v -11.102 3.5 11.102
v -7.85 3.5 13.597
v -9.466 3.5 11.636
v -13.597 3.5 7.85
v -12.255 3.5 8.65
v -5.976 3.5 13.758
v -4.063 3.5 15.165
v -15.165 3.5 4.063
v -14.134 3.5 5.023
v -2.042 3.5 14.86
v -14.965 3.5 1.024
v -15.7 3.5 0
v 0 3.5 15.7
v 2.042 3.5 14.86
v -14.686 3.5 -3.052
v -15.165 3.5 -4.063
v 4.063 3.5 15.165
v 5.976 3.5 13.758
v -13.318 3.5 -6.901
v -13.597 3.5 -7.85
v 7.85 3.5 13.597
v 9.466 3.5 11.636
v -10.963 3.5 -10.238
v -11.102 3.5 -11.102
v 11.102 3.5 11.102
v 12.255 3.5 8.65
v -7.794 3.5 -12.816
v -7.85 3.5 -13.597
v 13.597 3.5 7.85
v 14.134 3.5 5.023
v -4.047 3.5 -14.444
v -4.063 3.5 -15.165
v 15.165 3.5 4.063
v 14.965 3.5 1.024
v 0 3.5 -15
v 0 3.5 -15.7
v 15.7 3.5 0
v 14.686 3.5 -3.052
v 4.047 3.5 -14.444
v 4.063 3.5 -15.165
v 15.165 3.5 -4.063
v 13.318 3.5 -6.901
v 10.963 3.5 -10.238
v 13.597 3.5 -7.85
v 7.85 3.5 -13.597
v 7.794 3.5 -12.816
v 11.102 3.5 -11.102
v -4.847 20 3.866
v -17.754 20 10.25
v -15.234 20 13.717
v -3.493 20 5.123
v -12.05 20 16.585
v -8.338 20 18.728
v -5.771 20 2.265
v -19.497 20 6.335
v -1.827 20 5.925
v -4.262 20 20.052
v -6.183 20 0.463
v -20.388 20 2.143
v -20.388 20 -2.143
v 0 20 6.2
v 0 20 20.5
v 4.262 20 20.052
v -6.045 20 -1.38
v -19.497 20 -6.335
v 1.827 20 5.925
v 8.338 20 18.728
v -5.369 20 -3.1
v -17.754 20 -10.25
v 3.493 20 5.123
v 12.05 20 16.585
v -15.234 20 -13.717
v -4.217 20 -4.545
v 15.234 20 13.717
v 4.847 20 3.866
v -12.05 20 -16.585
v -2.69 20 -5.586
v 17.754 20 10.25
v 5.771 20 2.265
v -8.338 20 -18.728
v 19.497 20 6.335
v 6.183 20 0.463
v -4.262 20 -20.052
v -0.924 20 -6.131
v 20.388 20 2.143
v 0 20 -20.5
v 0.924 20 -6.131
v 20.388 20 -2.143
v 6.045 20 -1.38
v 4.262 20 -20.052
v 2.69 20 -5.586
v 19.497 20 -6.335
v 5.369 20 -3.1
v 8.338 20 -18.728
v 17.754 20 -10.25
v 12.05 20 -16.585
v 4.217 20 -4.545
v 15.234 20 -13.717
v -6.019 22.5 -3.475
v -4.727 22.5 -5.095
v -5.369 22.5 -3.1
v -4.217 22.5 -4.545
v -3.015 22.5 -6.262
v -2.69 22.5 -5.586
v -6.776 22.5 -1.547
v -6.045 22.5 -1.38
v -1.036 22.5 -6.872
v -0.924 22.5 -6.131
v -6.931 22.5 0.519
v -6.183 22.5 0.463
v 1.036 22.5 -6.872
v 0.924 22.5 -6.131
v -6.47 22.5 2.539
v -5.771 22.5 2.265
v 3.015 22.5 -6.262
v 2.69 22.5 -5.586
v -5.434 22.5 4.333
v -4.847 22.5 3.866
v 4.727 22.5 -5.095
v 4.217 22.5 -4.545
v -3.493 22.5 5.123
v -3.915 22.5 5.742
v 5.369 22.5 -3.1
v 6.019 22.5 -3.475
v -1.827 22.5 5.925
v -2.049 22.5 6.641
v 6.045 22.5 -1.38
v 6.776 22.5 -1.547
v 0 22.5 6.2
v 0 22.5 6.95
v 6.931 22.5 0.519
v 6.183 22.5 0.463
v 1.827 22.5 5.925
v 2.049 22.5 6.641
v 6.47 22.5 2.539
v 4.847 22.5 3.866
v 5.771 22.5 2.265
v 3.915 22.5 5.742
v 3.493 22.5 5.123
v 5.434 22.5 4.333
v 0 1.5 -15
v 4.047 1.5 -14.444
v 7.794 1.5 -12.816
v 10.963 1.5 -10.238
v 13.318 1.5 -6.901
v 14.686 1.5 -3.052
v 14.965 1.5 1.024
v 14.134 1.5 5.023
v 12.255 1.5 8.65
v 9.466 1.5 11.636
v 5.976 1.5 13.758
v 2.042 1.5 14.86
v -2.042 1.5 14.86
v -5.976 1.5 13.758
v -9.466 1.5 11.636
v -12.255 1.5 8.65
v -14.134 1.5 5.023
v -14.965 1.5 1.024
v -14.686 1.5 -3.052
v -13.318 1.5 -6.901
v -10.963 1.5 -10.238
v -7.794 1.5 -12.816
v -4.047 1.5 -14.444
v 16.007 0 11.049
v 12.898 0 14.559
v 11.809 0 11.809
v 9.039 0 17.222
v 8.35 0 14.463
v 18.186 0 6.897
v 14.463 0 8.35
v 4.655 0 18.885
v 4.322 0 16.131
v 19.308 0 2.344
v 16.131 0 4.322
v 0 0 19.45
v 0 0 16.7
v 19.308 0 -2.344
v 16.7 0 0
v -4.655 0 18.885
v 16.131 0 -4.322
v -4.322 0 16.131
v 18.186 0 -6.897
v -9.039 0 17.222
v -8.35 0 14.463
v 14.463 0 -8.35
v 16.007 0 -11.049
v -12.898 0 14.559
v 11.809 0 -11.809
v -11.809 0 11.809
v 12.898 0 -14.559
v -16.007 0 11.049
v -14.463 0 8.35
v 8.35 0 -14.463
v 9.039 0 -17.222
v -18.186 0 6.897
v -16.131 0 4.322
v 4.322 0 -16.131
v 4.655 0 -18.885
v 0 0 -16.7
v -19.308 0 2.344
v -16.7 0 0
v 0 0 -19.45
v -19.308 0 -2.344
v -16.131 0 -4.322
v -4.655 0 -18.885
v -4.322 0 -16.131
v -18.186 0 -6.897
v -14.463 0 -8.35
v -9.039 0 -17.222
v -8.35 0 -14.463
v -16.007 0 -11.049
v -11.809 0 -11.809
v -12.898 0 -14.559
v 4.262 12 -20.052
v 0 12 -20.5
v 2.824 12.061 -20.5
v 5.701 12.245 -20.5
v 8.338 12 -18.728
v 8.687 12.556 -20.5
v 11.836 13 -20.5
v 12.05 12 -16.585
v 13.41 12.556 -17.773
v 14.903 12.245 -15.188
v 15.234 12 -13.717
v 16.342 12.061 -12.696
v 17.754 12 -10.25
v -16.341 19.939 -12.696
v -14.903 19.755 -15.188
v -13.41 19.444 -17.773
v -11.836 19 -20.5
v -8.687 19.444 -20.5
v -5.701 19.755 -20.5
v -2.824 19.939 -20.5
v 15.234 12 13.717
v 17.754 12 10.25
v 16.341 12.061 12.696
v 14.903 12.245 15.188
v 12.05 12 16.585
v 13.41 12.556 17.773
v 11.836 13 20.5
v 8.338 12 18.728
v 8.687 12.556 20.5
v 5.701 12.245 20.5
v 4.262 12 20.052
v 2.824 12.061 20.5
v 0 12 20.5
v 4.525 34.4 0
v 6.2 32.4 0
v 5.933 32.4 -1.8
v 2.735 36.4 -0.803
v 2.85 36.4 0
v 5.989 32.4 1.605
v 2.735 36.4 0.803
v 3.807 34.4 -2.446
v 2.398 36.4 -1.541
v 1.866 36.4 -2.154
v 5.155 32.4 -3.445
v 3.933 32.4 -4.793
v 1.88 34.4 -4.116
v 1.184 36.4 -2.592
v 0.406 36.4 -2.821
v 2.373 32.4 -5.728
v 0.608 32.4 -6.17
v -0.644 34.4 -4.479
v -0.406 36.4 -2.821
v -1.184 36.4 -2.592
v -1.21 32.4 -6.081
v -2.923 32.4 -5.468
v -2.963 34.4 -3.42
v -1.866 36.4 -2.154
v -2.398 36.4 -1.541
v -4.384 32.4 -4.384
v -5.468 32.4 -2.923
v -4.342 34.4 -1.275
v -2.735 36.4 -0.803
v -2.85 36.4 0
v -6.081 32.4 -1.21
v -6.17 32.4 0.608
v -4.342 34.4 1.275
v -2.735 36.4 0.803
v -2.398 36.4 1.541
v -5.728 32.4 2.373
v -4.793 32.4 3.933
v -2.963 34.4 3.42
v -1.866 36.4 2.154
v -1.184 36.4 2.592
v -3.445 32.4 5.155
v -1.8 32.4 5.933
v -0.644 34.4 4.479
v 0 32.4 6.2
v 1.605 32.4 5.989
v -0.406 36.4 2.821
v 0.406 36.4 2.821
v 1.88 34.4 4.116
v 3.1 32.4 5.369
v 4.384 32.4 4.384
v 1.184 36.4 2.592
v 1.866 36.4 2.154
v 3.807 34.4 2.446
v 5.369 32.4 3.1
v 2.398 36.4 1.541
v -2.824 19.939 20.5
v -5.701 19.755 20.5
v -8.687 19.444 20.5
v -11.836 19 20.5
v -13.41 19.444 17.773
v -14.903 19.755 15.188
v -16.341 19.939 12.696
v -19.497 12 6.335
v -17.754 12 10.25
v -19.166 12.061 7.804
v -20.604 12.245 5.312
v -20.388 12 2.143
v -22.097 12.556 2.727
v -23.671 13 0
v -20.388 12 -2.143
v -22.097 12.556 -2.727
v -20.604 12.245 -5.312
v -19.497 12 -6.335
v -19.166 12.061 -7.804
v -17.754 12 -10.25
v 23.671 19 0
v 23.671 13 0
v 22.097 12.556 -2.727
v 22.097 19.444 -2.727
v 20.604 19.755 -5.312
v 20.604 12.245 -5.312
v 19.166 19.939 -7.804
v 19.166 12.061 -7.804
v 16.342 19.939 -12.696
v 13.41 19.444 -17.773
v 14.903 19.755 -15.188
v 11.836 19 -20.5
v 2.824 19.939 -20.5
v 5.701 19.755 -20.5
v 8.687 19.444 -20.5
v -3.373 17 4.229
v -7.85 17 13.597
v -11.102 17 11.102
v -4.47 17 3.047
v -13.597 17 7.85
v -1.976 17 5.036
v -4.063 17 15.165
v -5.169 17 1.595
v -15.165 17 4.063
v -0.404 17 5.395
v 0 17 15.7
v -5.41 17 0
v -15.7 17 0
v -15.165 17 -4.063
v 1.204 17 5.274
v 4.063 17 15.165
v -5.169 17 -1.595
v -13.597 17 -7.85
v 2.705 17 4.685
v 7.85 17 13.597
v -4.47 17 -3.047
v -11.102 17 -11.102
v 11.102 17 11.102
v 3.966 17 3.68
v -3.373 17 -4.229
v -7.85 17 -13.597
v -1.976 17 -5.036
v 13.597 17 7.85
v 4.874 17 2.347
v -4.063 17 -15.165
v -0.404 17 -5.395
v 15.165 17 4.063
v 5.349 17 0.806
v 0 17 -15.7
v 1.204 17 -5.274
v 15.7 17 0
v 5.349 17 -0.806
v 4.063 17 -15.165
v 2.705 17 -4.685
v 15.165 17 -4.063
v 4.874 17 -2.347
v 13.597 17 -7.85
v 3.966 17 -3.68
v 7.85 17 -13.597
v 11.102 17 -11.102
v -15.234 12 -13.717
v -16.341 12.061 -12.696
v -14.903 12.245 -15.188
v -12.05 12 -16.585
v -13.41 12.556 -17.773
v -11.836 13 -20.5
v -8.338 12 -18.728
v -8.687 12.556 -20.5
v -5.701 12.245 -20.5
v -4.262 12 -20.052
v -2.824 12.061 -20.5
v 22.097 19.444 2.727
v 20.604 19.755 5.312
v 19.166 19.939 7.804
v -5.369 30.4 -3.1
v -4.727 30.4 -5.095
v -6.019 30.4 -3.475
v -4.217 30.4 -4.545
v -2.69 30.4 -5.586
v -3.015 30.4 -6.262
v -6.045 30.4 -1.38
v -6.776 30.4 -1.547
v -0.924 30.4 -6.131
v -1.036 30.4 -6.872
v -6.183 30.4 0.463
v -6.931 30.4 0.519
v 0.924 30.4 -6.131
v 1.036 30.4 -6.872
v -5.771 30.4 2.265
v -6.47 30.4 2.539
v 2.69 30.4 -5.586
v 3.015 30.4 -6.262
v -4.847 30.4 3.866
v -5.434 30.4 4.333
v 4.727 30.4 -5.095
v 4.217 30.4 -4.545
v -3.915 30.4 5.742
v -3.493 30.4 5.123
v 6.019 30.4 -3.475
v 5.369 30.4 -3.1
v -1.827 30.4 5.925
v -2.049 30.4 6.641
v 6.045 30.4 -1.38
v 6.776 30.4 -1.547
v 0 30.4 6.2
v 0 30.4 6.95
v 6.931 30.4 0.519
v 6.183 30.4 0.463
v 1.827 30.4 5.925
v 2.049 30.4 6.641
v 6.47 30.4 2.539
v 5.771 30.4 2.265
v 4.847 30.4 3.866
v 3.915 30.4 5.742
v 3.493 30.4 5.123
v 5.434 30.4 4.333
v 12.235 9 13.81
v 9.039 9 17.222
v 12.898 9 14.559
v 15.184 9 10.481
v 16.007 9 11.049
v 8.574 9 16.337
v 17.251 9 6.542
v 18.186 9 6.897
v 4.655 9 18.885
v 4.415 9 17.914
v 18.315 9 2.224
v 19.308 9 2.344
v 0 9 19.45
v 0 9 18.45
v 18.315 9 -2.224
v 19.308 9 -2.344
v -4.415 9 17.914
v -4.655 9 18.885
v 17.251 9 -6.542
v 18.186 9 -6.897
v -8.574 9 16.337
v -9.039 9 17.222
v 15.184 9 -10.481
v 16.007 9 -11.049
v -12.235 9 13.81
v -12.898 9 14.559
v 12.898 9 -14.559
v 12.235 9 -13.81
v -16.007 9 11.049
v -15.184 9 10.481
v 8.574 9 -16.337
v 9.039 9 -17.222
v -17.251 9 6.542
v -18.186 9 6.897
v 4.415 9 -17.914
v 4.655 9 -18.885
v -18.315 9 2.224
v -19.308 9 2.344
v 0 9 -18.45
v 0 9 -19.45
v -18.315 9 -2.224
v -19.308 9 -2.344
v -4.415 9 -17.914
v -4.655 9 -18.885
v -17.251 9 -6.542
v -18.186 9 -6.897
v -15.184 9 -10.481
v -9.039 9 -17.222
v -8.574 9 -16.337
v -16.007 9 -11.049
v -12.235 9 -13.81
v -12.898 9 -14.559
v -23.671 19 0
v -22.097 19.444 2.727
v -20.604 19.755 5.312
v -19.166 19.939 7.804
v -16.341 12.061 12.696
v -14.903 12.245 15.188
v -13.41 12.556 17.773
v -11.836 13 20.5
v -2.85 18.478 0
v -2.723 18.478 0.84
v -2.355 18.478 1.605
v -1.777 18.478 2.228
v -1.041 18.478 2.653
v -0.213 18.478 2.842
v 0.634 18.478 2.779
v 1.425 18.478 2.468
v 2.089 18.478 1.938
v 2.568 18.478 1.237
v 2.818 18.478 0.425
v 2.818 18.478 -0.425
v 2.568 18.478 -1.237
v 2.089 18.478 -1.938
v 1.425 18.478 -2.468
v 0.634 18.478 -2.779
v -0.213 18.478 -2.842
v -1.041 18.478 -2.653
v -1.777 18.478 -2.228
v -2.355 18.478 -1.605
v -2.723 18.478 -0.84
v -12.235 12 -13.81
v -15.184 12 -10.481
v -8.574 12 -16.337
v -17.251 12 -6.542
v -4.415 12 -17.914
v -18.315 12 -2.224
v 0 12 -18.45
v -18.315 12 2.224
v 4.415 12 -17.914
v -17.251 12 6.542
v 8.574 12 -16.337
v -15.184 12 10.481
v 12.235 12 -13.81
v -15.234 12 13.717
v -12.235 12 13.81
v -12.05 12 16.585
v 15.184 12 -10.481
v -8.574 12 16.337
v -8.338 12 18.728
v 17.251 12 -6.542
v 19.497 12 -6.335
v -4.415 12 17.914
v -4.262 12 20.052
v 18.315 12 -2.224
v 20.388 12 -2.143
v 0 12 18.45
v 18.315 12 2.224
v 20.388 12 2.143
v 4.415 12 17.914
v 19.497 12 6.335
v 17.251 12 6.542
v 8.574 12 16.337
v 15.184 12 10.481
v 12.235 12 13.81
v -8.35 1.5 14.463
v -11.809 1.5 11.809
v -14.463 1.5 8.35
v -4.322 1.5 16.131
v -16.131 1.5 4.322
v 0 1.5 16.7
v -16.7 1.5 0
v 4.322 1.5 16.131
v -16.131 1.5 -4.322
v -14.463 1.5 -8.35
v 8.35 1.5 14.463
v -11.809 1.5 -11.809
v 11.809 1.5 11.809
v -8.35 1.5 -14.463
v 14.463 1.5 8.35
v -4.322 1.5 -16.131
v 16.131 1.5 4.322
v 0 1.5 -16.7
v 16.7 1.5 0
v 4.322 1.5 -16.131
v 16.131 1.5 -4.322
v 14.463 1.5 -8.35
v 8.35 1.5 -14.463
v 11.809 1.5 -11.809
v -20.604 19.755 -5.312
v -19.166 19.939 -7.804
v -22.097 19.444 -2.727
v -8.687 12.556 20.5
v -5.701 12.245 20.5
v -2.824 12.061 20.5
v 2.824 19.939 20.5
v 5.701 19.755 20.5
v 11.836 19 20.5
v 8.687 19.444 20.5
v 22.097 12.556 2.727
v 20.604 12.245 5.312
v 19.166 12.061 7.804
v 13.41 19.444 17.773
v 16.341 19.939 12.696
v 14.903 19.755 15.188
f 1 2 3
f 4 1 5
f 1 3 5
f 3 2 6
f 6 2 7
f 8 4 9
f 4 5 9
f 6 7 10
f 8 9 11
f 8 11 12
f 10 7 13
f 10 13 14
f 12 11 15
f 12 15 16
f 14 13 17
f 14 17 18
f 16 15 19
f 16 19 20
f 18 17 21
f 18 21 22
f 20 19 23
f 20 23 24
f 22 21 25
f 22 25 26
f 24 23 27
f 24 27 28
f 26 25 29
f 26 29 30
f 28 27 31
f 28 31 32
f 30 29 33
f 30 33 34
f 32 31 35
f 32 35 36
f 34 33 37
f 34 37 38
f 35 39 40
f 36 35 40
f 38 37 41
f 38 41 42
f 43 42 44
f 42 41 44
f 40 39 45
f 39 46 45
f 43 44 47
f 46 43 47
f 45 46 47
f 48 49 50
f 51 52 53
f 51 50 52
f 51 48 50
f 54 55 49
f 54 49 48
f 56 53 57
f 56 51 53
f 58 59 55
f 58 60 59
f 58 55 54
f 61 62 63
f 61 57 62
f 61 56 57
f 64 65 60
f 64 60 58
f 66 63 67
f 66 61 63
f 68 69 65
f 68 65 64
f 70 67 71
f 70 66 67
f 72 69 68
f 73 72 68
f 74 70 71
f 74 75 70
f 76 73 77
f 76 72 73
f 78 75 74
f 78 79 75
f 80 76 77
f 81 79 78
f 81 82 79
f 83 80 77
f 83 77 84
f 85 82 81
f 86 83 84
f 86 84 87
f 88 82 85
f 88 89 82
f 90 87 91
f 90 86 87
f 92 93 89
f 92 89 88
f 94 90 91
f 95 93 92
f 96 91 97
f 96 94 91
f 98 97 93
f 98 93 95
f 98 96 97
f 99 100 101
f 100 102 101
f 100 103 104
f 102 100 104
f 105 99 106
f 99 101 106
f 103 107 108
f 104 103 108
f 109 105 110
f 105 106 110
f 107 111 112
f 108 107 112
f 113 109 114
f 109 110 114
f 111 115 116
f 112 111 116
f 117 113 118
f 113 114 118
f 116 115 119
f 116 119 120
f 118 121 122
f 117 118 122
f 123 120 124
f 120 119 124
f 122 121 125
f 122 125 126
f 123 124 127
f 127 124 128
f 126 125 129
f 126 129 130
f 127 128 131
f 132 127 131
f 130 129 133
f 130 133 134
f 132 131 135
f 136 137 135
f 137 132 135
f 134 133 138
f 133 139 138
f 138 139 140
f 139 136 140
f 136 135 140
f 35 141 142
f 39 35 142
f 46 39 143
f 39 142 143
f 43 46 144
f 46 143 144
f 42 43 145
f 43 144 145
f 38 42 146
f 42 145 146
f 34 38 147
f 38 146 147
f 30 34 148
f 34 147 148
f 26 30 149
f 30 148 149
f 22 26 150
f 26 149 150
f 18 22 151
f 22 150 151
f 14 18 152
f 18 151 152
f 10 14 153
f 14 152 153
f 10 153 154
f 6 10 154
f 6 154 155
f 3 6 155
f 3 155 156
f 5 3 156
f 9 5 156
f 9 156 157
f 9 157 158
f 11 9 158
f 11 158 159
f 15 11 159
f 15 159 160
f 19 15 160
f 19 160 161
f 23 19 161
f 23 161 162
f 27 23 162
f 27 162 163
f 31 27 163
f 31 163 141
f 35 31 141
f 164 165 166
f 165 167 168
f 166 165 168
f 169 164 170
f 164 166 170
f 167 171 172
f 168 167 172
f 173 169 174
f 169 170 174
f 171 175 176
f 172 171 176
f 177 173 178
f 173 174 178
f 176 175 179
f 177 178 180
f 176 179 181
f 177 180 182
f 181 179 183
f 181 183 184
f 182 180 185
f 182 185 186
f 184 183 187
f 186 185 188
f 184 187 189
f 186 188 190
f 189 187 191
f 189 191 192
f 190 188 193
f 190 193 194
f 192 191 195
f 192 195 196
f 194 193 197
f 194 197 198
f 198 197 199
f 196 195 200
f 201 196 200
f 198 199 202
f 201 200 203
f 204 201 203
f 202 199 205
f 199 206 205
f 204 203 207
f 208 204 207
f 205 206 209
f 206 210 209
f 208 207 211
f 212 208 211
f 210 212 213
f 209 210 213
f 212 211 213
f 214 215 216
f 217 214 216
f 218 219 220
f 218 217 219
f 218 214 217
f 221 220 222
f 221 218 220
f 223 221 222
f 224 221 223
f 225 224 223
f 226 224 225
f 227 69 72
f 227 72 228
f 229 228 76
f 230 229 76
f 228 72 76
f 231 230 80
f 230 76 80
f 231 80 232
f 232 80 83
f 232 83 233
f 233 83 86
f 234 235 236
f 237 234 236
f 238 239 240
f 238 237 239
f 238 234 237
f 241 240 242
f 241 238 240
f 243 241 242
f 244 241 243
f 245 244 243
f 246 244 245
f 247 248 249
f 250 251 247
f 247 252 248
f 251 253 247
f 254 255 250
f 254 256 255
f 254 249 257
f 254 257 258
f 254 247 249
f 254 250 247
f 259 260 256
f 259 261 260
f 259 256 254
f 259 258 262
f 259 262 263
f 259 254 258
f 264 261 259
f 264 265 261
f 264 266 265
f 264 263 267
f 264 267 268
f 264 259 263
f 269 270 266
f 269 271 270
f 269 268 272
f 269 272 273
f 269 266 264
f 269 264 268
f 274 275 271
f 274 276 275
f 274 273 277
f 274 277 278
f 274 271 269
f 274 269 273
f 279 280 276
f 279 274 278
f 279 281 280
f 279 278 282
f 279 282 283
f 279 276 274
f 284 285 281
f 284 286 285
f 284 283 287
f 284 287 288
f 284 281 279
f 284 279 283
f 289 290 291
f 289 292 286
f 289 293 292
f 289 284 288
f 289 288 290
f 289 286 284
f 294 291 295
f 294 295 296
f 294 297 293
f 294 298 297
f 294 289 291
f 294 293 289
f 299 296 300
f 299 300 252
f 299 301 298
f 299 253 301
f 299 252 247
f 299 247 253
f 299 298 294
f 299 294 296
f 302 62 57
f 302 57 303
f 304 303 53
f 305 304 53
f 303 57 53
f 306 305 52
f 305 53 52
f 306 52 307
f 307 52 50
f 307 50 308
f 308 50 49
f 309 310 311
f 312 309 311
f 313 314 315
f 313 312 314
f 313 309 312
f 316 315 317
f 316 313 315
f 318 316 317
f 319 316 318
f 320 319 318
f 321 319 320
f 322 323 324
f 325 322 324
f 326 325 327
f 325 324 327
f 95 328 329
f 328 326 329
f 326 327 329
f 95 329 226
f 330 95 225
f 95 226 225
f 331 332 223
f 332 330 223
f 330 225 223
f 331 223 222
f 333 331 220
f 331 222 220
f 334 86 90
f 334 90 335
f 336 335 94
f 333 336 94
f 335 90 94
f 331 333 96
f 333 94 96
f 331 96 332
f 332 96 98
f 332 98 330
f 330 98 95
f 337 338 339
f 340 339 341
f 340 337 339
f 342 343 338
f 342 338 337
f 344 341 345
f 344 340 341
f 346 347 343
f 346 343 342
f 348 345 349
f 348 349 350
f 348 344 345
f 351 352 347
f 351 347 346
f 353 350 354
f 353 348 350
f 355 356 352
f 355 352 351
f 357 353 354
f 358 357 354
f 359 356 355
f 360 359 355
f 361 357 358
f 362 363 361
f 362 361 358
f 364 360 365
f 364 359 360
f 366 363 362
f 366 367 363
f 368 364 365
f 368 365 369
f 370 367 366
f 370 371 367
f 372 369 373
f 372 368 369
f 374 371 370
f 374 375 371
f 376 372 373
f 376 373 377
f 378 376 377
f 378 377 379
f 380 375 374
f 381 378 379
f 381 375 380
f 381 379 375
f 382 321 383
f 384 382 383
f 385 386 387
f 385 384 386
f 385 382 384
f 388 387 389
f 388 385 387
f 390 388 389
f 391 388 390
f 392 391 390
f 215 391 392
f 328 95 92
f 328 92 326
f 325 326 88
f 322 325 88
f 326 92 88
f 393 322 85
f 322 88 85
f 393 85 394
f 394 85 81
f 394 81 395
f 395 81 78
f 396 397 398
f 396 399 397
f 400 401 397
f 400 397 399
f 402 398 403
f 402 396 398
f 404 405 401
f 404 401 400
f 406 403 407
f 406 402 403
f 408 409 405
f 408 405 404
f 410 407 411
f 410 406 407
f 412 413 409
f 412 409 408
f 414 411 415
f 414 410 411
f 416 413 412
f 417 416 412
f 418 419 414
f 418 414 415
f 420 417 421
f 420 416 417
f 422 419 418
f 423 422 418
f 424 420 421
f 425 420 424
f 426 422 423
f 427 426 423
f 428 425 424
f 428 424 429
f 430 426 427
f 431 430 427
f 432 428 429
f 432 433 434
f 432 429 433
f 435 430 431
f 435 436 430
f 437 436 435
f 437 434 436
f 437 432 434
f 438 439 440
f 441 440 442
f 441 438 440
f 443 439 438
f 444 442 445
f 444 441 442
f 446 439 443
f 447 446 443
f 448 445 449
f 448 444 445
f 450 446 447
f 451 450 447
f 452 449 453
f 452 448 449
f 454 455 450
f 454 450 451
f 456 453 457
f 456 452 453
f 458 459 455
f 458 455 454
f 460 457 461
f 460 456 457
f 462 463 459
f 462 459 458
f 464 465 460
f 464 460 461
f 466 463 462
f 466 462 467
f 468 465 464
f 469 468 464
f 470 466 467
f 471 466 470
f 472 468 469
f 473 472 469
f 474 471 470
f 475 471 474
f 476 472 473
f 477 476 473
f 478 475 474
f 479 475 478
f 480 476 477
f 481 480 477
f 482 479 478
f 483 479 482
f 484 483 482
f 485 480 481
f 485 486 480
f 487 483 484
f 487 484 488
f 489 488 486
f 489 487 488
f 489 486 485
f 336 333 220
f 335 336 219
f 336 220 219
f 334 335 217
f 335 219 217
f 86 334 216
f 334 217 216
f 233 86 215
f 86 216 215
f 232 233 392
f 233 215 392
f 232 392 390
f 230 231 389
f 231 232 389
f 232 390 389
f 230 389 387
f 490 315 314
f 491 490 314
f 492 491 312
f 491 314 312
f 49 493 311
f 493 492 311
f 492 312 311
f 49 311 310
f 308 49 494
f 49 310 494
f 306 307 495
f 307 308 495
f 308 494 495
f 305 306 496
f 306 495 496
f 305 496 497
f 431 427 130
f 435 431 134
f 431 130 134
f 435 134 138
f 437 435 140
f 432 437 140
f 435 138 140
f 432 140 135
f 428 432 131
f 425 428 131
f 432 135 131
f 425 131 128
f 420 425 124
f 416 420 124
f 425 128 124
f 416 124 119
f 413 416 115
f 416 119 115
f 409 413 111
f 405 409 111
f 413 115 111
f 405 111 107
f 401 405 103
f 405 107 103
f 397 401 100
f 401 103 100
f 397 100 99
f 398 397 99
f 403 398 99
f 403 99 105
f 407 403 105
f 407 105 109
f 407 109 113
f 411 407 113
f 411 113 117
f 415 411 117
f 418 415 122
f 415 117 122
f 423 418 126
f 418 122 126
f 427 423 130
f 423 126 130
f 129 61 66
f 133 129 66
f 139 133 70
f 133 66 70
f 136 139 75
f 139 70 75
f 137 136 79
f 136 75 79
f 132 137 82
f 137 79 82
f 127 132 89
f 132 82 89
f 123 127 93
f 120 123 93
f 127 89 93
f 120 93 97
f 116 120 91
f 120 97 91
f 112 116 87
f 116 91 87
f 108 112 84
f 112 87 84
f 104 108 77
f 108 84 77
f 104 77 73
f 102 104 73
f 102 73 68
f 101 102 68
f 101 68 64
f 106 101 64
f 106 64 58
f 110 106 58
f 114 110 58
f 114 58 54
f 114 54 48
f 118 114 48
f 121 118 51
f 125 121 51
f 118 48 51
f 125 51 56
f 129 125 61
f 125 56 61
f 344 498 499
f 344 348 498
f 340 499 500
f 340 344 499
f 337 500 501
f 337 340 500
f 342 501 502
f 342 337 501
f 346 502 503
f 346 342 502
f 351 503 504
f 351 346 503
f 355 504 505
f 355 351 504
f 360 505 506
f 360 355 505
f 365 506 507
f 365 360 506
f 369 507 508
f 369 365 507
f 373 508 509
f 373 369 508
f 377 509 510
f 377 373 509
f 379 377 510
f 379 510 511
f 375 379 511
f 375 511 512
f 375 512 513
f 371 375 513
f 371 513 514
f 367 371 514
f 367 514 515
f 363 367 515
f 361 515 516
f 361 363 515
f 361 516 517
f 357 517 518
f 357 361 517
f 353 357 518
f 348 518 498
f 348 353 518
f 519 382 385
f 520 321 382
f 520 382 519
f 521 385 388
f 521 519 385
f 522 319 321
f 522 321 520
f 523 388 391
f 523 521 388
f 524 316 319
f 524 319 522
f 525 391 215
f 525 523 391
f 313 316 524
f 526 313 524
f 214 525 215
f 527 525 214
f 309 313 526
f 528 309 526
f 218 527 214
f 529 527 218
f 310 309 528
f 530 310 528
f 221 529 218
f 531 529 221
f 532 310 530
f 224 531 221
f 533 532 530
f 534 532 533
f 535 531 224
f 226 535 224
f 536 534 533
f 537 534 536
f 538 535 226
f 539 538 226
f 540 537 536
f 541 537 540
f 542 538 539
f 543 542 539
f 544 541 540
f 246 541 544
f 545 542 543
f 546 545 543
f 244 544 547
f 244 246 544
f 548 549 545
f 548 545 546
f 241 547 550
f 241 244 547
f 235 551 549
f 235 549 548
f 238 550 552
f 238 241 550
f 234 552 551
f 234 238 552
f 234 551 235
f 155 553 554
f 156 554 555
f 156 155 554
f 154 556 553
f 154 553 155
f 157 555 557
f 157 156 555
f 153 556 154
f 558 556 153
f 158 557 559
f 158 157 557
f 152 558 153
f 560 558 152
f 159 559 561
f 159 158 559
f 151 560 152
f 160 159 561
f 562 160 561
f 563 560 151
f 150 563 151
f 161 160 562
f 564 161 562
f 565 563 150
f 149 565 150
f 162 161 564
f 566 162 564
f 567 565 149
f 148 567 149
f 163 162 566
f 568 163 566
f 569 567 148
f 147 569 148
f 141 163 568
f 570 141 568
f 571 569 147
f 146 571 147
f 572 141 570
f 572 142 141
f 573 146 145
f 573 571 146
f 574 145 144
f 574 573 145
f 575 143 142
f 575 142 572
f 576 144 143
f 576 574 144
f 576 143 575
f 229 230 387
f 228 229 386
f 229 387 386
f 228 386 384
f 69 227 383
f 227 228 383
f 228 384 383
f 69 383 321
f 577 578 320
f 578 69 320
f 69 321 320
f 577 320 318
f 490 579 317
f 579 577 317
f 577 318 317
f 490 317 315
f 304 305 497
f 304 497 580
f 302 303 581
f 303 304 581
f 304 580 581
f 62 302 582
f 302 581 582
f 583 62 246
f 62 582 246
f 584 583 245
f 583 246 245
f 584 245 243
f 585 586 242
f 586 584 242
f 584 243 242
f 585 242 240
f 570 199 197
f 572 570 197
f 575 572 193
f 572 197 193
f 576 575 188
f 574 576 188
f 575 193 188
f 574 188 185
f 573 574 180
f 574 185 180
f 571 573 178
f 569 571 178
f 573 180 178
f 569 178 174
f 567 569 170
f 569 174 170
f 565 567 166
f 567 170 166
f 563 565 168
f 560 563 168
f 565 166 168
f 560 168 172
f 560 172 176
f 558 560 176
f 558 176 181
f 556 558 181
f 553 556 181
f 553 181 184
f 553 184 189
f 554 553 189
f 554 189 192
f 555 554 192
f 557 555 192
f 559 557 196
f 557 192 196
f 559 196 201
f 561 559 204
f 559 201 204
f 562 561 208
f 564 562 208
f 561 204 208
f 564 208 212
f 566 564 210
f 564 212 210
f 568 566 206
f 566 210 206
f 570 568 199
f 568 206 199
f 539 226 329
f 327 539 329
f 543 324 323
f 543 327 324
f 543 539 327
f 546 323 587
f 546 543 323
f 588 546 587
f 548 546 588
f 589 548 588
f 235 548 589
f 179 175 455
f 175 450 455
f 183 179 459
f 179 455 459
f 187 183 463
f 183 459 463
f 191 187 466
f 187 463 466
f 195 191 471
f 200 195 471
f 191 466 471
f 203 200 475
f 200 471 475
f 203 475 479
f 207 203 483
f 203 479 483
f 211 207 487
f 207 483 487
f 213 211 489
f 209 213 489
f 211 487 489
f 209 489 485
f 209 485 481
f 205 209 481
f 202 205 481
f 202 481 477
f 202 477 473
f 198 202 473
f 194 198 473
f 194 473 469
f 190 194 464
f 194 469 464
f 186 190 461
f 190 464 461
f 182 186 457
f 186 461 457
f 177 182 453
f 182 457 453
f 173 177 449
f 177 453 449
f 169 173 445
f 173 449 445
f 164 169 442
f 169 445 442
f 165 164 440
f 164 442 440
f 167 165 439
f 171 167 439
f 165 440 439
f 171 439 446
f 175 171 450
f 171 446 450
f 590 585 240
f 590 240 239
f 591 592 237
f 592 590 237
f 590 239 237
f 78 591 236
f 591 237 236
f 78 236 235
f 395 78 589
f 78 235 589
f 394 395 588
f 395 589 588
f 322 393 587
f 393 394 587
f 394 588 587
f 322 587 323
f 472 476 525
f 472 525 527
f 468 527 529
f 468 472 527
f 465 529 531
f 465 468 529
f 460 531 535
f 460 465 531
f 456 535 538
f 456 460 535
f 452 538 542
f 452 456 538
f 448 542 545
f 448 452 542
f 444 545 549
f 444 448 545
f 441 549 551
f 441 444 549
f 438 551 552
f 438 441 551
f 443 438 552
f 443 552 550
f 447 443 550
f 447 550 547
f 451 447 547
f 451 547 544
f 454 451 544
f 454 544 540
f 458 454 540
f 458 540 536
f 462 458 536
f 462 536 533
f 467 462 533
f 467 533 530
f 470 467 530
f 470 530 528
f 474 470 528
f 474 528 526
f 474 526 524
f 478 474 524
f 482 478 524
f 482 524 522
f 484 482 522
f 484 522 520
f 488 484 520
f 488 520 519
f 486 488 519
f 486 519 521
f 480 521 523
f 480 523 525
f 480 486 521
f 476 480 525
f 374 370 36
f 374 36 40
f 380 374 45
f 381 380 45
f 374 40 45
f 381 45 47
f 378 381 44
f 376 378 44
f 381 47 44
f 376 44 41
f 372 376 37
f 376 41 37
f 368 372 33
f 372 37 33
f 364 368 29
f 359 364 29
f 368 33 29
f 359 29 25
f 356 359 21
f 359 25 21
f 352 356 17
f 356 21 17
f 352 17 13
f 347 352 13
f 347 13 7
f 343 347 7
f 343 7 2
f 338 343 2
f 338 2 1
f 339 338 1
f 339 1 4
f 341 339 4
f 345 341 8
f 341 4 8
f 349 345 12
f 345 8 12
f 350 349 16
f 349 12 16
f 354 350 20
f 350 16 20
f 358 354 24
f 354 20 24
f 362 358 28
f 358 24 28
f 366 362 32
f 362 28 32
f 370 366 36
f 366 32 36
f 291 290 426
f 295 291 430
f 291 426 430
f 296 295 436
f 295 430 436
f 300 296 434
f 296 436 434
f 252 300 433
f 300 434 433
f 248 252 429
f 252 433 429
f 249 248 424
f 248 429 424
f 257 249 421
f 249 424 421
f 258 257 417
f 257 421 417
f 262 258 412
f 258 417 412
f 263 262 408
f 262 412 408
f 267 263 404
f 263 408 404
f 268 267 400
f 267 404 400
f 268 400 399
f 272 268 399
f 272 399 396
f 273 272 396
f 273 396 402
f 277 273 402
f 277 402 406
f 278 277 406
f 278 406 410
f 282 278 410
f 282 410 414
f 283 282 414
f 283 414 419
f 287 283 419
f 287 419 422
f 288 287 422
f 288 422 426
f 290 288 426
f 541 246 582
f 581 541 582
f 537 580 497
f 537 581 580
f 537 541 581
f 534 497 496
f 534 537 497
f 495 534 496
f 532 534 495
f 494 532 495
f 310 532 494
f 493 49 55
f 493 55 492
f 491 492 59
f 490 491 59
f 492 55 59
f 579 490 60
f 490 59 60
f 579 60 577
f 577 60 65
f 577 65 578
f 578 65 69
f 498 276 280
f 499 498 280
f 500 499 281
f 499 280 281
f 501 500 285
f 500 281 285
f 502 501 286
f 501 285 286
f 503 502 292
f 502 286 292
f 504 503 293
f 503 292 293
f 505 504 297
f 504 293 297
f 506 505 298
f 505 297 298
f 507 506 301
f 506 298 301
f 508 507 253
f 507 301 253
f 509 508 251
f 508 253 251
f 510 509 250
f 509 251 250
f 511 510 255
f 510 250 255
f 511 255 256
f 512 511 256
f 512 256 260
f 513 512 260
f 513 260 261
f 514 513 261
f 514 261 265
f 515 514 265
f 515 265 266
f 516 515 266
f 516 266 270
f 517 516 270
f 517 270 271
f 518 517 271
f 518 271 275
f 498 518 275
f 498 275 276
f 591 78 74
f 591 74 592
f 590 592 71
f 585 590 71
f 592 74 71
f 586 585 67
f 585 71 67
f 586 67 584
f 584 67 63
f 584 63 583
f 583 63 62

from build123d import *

# Parameters (mm, degrees)
EXTRUDE_1_DEPTH     = 20
SKETCH_3_OUTSIDE_W  = 62.49
SKETCH_3_OUTSIDE_H  = 56.148
SKETCH_3_OUTSIDE_R  = 18.45
CUT_EXTRUDE_1_DEPTH = 12
SKETCH_11_R         = 16.7
CUT_EXTRUDE_2_DEPTH = 1.5
SKETCH_13_R         = 15
CUT_EXTRUDE_4_DEPTH = 17
SKETCH_14_R         = 15.7
CUT_EXTRUDE_5_DEPTH = 13.5
SKETCH_15_W         = 1
SKETCH_15_H         = 9
SKETCH_16_R         = 6.2
EXTRUDE_2_DEPTH     = 2.5
SKETCH_17_R         = 6.95
EXTRUDE_3_DEPTH     = 7.9
SKETCH_18_R         = 6.2
EXTRUDE_4_DEPTH     = 2
SKETCH_21_R         = 2.85
CUT_EXTRUDE_6_DEPTH = 49.016073698


with BuildPart() as part:
    # Эскиз2 → Бобышка-Вытянуть1 (new body)
    with BuildSketch(Plane(origin=(0, 0, 0), x_dir=(1, 0, 0), z_dir=(0, 1, 0))):
        Polygon((11.835680518, -20.5), (23.671361037, 0), (11.835680518, 20.5), (-11.835680518, 20.5), (-23.671361037, 0), (-11.835680518, -20.5), align=None)
    extrude(amount=EXTRUDE_1_DEPTH)

    # Эскиз3 outside → Вырез-Вытянуть1 (cut)
    with BuildSketch(Plane.XZ):
        Rectangle(SKETCH_3_OUTSIDE_W, SKETCH_3_OUTSIDE_H)
        with Locations(Location((0, 0, 0), (0, 0, 270))):
            Circle(SKETCH_3_OUTSIDE_R, mode=Mode.SUBTRACT)
    extrude(amount=-CUT_EXTRUDE_1_DEPTH, mode=Mode.SUBTRACT)

    # Эскиз10 → Вырез-Повернуть1 (revolve, cut)
    with BuildSketch(Plane.XY):
        Polygon((23.671361037, 20), (23.671361037, 19), (20.5, 20), align=None)
    cut_revolve_1 = revolve(axis=Axis((0, 12, 0), (0, -1, 0)), mode=Mode.SUBTRACT)

    # Зеркальное отражение1: Вырез-Повернуть1 across plane
    add(cut_revolve_1.mirror(Plane(origin=(0, 16, 0), x_dir=(0, 0, 1), z_dir=(0, -1, 0))), mode=Mode.SUBTRACT)

    # Эскиз11 → Вырез-Вытянуть2 (cut)
    with BuildSketch(Plane.XZ):
        with Locations(Location((0, 0, 0), (0, 0, 270))):
            Circle(SKETCH_11_R)
    extrude(amount=-CUT_EXTRUDE_2_DEPTH, mode=Mode.SUBTRACT)

    # Эскиз13 → Вырез-Вытянуть4 (cut)
    with BuildSketch(Plane.XZ):
        with Locations(Location((0, 0, 0), (0, 0, 270))):
            Circle(SKETCH_13_R)
    extrude(amount=-CUT_EXTRUDE_4_DEPTH, mode=Mode.SUBTRACT)

    # Эскиз14 → Вырез-Вытянуть5 (cut)
    with BuildSketch(Plane(origin=(0, 3.5, 0), x_dir=(-1, 0, 0), z_dir=(0, -1, 0))):
        with Locations(Location((0, 0, 0), (0, 0, 90))):
            Circle(SKETCH_14_R)
    extrude(amount=-CUT_EXTRUDE_5_DEPTH, mode=Mode.SUBTRACT)

    # Эскиз15 → Повернуть1 (revolve)
    with BuildSketch(Plane.XY, mode=Mode.PRIVATE) as revolve_1_sk:
        with Locations((18.95, 4.5)):
            Rectangle(SKETCH_15_W, SKETCH_15_H)
    revolve(revolve_1_sk.sketch.rotate(Axis((0, 17, 0), (0, -1, 0)), 90), axis=Axis((0, 17, 0), (0, -1, 0)))

    # Эскиз16 → Бобышка-Вытянуть2 (add)
    with BuildSketch(Plane(origin=(0, 20, 0), x_dir=(1, 0, 0), z_dir=(0, 1, 0))):
        with Locations(Location((0, 0, 0), (0, 0, 270))):
            Circle(SKETCH_16_R)
    extrude(amount=EXTRUDE_2_DEPTH)

    # Эскиз17 → Бобышка-Вытянуть3 (add)
    with BuildSketch(Plane(origin=(0, 22.5, 0), x_dir=(1, 0, 0), z_dir=(0, 1, 0))):
        with Locations(Location((0, 0, 0), (0, 0, 270))):
            Circle(SKETCH_17_R)
    extrude(amount=EXTRUDE_3_DEPTH)

    # Эскиз18 → Бобышка-Вытянуть4 (add)
    with BuildSketch(Plane(origin=(0, 30.4, 0), x_dir=(1, 0, 0), z_dir=(0, 1, 0))):
        with Locations(Location((0, 0, 0), (0, 0, 270))):
            Circle(SKETCH_18_R)
    extrude(amount=EXTRUDE_4_DEPTH)

    # Эскиз19 → Повернуть2 (revolve)
    with BuildSketch(Plane.XY):
        Polygon((6.2, 32.4), (2.85, 36.4), (0, 36.4), (0, 32.4), align=None)
    revolve(axis=Axis((0, -964.782676563, 0), (0, 1, 0)))

    # Эскиз21 → Вырез-Вытянуть6 (cut, through all)
    with BuildSketch(Plane(origin=(0, 36.4, 0), x_dir=(1, 0, 0), z_dir=(0, 1, 0))):
        with Locations(Location((0, 0, 0), (0, 0, 180))):
            Circle(SKETCH_21_R)
    extrude(amount=-CUT_EXTRUDE_6_DEPTH, mode=Mode.SUBTRACT)

    # Эскиз22 → Вырез-Повернуть2 (revolve, cut)
    with BuildSketch(Plane.XY, mode=Mode.PRIVATE) as cut_revolve_2_sk:
        Polygon((0, 20.123304437), (5.409721973, 17), (0, 17), align=None)
    revolve(cut_revolve_2_sk.sketch.rotate(Axis((0, 17, 0), (0, 1, 0)), 180), axis=Axis((0, 17, 0), (0, 1, 0)), mode=Mode.SUBTRACT)


solid = part.part
